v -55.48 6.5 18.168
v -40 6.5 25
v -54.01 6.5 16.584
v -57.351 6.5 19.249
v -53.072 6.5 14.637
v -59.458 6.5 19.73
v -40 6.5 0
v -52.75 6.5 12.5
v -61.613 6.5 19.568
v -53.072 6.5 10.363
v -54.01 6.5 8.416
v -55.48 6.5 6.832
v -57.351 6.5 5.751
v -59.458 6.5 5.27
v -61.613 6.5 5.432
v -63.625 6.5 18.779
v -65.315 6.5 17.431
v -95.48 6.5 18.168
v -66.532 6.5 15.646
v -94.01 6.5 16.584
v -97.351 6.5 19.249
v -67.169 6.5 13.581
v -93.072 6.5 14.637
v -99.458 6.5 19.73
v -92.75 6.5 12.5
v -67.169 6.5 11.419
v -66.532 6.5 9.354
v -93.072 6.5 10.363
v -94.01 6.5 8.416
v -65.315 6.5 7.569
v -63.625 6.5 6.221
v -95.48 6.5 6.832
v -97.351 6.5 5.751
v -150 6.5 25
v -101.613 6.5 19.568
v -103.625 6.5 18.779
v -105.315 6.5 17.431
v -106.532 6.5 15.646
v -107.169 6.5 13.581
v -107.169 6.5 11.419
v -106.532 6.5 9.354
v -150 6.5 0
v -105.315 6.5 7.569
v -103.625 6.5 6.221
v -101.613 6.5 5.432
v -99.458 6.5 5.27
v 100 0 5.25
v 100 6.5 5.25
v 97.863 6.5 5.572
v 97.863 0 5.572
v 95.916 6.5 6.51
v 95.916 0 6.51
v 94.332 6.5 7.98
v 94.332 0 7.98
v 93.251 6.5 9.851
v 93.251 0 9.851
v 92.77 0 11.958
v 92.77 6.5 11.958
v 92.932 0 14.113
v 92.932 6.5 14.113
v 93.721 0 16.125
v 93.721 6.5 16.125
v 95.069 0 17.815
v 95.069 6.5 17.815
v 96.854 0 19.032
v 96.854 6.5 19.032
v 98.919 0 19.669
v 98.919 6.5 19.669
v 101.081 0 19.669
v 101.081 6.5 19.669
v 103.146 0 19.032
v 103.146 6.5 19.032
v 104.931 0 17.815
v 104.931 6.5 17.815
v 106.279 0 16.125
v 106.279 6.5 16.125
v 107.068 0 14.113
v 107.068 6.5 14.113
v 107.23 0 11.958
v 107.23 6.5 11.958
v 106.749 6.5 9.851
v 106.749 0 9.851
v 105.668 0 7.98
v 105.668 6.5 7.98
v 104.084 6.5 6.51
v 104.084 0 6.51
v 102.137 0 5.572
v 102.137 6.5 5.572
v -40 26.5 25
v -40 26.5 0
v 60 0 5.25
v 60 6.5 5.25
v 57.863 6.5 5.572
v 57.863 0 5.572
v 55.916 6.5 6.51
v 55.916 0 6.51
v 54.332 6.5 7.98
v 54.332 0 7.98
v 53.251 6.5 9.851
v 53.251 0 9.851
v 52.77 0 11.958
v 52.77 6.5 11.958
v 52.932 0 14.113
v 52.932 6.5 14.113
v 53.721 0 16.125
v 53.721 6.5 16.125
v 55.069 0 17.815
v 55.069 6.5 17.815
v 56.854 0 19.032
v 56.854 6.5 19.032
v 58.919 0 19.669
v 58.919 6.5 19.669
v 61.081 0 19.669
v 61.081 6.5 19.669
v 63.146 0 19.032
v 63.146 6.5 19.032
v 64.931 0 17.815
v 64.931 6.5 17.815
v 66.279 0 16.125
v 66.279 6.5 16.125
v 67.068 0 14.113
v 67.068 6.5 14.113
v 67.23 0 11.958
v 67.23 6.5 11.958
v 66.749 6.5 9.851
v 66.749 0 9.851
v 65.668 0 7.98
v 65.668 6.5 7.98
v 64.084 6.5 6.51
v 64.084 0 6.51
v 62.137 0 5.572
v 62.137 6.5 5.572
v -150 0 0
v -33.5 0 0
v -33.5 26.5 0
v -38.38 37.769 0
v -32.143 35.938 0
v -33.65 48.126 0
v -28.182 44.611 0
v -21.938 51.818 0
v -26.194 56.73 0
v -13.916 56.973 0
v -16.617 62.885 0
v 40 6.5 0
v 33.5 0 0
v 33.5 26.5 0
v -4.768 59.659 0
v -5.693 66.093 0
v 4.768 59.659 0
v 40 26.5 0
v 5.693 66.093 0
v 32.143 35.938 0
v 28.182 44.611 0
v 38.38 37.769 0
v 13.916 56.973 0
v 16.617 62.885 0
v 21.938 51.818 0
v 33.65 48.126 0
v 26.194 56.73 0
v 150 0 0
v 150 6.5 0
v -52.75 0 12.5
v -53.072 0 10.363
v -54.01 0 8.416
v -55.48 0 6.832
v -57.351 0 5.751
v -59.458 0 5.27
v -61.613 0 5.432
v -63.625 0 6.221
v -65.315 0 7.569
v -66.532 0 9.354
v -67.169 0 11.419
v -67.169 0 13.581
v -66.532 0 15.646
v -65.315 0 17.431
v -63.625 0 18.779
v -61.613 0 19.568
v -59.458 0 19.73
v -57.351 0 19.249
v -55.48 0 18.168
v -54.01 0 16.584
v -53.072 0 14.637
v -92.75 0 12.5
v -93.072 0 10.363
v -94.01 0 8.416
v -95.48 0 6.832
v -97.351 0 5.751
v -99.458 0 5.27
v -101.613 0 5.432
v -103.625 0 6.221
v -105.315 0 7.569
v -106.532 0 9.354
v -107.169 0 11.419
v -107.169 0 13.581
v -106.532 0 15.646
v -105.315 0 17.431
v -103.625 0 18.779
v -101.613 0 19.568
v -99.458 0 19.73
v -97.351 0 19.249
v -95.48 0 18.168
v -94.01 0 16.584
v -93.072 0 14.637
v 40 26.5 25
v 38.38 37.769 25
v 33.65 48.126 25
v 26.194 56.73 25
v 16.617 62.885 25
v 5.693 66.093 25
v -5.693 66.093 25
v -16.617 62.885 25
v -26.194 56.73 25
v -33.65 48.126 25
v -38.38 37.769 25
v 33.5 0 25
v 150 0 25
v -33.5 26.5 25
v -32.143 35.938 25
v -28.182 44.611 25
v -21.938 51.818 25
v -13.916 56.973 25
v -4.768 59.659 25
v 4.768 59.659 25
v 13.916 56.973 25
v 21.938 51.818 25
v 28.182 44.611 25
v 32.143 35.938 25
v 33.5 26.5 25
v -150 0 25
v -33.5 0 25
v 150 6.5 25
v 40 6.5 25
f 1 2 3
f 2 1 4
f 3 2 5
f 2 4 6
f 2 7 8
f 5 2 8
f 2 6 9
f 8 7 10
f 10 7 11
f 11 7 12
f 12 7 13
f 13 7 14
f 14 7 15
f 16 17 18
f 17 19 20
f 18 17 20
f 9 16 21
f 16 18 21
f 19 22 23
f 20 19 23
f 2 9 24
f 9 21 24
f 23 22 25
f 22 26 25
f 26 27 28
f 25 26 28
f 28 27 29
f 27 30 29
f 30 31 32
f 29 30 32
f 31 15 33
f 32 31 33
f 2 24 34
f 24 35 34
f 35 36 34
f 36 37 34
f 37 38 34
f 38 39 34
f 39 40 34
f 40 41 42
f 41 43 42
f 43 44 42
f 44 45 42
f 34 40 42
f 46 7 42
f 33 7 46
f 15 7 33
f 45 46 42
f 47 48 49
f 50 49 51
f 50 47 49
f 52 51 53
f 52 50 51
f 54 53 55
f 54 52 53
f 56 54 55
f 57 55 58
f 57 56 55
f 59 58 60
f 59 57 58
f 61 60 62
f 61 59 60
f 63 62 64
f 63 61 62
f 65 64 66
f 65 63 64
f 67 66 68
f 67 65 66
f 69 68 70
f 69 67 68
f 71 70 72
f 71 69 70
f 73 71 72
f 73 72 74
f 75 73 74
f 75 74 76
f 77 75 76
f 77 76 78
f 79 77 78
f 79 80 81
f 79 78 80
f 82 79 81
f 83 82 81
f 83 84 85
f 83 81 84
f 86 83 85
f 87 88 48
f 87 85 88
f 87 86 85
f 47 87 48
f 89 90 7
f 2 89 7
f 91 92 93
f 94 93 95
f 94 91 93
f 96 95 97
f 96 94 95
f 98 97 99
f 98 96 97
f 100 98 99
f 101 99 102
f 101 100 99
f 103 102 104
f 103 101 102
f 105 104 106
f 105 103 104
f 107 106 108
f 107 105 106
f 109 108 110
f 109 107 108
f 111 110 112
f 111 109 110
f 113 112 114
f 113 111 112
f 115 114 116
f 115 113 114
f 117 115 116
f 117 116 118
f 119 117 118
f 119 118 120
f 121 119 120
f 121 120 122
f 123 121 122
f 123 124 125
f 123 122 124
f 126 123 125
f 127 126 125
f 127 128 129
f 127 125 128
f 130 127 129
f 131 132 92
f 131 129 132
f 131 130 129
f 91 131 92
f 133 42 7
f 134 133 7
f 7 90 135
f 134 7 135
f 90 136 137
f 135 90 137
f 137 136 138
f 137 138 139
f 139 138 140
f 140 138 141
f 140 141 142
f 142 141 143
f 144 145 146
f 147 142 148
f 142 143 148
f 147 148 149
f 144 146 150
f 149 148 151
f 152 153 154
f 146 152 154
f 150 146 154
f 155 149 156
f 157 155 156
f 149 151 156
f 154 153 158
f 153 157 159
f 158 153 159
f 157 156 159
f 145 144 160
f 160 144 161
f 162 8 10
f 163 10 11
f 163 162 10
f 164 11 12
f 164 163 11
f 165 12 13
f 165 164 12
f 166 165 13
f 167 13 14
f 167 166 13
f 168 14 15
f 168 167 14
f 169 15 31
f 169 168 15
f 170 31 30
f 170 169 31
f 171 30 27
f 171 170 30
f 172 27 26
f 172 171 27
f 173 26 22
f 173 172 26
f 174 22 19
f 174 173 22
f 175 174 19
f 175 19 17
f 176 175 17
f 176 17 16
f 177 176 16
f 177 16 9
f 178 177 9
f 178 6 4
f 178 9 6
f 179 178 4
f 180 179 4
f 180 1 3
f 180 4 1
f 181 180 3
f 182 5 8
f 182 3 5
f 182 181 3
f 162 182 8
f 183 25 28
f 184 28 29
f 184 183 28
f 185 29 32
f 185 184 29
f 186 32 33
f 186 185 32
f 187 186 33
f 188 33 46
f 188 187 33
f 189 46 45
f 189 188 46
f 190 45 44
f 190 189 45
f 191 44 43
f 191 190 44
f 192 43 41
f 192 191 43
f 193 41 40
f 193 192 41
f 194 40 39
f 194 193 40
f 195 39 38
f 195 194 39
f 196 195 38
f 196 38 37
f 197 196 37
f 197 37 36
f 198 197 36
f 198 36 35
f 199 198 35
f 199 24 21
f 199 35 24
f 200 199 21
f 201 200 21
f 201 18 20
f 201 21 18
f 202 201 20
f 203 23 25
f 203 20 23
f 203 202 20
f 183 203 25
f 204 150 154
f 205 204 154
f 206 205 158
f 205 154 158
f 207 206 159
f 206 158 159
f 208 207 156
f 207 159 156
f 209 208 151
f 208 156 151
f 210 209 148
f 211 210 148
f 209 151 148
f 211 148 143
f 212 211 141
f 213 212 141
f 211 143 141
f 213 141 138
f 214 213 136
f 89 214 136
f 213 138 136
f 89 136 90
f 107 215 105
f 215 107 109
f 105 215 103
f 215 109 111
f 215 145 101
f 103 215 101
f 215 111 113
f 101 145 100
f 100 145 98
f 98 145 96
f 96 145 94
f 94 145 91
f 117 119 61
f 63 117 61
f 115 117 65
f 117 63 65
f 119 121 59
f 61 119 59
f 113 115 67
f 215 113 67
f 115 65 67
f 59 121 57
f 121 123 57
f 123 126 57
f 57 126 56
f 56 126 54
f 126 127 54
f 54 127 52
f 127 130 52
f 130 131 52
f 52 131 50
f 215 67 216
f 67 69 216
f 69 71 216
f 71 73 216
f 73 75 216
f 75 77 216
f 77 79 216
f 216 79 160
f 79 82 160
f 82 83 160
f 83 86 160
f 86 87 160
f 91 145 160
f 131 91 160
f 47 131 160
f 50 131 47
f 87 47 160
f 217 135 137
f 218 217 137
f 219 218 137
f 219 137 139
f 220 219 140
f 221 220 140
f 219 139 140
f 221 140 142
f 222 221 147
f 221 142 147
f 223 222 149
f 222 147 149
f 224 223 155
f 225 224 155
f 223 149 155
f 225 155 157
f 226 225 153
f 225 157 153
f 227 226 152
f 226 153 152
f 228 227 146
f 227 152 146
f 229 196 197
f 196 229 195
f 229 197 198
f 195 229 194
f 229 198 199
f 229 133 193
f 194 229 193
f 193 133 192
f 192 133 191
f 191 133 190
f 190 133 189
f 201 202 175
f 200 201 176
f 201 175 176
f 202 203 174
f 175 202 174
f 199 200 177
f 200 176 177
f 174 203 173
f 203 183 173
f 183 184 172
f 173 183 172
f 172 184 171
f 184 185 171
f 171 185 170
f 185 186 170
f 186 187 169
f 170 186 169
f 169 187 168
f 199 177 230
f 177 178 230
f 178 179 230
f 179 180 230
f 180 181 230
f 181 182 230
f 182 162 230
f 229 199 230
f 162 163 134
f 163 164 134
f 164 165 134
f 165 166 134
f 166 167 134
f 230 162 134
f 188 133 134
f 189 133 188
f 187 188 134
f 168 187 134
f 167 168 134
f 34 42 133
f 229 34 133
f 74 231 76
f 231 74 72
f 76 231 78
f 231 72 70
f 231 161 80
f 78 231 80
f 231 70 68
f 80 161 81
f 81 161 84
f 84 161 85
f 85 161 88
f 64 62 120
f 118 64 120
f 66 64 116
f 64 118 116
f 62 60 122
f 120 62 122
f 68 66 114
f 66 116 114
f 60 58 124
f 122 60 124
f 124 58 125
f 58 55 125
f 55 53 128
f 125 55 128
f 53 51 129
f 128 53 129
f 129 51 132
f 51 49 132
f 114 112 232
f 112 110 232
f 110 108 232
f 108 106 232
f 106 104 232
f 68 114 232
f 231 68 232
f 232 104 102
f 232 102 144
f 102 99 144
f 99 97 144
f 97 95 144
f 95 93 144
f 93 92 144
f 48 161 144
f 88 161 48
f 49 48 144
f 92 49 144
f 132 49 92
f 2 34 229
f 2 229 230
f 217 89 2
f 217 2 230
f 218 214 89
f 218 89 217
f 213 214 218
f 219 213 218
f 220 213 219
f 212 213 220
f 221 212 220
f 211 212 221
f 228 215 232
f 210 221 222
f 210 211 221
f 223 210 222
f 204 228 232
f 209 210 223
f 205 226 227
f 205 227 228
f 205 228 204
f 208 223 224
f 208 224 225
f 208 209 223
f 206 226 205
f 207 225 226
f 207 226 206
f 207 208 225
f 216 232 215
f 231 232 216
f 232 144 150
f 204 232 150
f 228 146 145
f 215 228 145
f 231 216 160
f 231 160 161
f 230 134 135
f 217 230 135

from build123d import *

# Parameters (mm, degrees)
BOSS_EXTRUDE1_DEPTH = 25
SKETCH4_R           = 7.25
CUT_EXTRUDE1_DEPTH  = 25


with BuildPart() as part:
    # Sketch1 → Boss-Extrude1 (new body)
    with BuildSketch(Plane.XY):
        with BuildLine():
            Line((150, 0), (150, 6.5))
            Line((150, 6.5), (40, 6.5))
            Line((40, 6.5), (40, 26.5))
            ThreePointArc((40, 26.5), (0, 66.5), (-40, 26.5))
            Line((-40, 26.5), (-40, 6.5))
            Line((-40, 6.5), (-150, 6.5))
            Line((-150, 6.5), (-150, 0))
            Line((-150, 0), (-33.5, 0))
            Line((-33.5, 0), (-33.5, 26.5))
            ThreePointArc((-33.5, 26.5), (0, 60), (33.5, 26.5))
            Line((33.5, 26.5), (33.5, 0))
            Line((33.5, 0), (150, 0))
        make_face()
    extrude(amount=BOSS_EXTRUDE1_DEPTH)

    # Sketch4 → Cut-Extrude1 (cut)
    with BuildSketch(Plane(origin=(0, 0, 0), x_dir=(1, 0, 0), z_dir=(0, 1, 0))):
        with Locations((-60, -12.5)):
            Circle(SKETCH4_R)
        with Locations((-100, -12.5)):
            Circle(SKETCH4_R)
        with Locations(Location((60, -12.5, 0), (0, 0, 90))):
            Circle(SKETCH4_R)
        with Locations(Location((100, -12.5, 0), (0, 0, 90))):
            Circle(SKETCH4_R)
    extrude(amount=CUT_EXTRUDE1_DEPTH, mode=Mode.SUBTRACT)


solid = part.part
